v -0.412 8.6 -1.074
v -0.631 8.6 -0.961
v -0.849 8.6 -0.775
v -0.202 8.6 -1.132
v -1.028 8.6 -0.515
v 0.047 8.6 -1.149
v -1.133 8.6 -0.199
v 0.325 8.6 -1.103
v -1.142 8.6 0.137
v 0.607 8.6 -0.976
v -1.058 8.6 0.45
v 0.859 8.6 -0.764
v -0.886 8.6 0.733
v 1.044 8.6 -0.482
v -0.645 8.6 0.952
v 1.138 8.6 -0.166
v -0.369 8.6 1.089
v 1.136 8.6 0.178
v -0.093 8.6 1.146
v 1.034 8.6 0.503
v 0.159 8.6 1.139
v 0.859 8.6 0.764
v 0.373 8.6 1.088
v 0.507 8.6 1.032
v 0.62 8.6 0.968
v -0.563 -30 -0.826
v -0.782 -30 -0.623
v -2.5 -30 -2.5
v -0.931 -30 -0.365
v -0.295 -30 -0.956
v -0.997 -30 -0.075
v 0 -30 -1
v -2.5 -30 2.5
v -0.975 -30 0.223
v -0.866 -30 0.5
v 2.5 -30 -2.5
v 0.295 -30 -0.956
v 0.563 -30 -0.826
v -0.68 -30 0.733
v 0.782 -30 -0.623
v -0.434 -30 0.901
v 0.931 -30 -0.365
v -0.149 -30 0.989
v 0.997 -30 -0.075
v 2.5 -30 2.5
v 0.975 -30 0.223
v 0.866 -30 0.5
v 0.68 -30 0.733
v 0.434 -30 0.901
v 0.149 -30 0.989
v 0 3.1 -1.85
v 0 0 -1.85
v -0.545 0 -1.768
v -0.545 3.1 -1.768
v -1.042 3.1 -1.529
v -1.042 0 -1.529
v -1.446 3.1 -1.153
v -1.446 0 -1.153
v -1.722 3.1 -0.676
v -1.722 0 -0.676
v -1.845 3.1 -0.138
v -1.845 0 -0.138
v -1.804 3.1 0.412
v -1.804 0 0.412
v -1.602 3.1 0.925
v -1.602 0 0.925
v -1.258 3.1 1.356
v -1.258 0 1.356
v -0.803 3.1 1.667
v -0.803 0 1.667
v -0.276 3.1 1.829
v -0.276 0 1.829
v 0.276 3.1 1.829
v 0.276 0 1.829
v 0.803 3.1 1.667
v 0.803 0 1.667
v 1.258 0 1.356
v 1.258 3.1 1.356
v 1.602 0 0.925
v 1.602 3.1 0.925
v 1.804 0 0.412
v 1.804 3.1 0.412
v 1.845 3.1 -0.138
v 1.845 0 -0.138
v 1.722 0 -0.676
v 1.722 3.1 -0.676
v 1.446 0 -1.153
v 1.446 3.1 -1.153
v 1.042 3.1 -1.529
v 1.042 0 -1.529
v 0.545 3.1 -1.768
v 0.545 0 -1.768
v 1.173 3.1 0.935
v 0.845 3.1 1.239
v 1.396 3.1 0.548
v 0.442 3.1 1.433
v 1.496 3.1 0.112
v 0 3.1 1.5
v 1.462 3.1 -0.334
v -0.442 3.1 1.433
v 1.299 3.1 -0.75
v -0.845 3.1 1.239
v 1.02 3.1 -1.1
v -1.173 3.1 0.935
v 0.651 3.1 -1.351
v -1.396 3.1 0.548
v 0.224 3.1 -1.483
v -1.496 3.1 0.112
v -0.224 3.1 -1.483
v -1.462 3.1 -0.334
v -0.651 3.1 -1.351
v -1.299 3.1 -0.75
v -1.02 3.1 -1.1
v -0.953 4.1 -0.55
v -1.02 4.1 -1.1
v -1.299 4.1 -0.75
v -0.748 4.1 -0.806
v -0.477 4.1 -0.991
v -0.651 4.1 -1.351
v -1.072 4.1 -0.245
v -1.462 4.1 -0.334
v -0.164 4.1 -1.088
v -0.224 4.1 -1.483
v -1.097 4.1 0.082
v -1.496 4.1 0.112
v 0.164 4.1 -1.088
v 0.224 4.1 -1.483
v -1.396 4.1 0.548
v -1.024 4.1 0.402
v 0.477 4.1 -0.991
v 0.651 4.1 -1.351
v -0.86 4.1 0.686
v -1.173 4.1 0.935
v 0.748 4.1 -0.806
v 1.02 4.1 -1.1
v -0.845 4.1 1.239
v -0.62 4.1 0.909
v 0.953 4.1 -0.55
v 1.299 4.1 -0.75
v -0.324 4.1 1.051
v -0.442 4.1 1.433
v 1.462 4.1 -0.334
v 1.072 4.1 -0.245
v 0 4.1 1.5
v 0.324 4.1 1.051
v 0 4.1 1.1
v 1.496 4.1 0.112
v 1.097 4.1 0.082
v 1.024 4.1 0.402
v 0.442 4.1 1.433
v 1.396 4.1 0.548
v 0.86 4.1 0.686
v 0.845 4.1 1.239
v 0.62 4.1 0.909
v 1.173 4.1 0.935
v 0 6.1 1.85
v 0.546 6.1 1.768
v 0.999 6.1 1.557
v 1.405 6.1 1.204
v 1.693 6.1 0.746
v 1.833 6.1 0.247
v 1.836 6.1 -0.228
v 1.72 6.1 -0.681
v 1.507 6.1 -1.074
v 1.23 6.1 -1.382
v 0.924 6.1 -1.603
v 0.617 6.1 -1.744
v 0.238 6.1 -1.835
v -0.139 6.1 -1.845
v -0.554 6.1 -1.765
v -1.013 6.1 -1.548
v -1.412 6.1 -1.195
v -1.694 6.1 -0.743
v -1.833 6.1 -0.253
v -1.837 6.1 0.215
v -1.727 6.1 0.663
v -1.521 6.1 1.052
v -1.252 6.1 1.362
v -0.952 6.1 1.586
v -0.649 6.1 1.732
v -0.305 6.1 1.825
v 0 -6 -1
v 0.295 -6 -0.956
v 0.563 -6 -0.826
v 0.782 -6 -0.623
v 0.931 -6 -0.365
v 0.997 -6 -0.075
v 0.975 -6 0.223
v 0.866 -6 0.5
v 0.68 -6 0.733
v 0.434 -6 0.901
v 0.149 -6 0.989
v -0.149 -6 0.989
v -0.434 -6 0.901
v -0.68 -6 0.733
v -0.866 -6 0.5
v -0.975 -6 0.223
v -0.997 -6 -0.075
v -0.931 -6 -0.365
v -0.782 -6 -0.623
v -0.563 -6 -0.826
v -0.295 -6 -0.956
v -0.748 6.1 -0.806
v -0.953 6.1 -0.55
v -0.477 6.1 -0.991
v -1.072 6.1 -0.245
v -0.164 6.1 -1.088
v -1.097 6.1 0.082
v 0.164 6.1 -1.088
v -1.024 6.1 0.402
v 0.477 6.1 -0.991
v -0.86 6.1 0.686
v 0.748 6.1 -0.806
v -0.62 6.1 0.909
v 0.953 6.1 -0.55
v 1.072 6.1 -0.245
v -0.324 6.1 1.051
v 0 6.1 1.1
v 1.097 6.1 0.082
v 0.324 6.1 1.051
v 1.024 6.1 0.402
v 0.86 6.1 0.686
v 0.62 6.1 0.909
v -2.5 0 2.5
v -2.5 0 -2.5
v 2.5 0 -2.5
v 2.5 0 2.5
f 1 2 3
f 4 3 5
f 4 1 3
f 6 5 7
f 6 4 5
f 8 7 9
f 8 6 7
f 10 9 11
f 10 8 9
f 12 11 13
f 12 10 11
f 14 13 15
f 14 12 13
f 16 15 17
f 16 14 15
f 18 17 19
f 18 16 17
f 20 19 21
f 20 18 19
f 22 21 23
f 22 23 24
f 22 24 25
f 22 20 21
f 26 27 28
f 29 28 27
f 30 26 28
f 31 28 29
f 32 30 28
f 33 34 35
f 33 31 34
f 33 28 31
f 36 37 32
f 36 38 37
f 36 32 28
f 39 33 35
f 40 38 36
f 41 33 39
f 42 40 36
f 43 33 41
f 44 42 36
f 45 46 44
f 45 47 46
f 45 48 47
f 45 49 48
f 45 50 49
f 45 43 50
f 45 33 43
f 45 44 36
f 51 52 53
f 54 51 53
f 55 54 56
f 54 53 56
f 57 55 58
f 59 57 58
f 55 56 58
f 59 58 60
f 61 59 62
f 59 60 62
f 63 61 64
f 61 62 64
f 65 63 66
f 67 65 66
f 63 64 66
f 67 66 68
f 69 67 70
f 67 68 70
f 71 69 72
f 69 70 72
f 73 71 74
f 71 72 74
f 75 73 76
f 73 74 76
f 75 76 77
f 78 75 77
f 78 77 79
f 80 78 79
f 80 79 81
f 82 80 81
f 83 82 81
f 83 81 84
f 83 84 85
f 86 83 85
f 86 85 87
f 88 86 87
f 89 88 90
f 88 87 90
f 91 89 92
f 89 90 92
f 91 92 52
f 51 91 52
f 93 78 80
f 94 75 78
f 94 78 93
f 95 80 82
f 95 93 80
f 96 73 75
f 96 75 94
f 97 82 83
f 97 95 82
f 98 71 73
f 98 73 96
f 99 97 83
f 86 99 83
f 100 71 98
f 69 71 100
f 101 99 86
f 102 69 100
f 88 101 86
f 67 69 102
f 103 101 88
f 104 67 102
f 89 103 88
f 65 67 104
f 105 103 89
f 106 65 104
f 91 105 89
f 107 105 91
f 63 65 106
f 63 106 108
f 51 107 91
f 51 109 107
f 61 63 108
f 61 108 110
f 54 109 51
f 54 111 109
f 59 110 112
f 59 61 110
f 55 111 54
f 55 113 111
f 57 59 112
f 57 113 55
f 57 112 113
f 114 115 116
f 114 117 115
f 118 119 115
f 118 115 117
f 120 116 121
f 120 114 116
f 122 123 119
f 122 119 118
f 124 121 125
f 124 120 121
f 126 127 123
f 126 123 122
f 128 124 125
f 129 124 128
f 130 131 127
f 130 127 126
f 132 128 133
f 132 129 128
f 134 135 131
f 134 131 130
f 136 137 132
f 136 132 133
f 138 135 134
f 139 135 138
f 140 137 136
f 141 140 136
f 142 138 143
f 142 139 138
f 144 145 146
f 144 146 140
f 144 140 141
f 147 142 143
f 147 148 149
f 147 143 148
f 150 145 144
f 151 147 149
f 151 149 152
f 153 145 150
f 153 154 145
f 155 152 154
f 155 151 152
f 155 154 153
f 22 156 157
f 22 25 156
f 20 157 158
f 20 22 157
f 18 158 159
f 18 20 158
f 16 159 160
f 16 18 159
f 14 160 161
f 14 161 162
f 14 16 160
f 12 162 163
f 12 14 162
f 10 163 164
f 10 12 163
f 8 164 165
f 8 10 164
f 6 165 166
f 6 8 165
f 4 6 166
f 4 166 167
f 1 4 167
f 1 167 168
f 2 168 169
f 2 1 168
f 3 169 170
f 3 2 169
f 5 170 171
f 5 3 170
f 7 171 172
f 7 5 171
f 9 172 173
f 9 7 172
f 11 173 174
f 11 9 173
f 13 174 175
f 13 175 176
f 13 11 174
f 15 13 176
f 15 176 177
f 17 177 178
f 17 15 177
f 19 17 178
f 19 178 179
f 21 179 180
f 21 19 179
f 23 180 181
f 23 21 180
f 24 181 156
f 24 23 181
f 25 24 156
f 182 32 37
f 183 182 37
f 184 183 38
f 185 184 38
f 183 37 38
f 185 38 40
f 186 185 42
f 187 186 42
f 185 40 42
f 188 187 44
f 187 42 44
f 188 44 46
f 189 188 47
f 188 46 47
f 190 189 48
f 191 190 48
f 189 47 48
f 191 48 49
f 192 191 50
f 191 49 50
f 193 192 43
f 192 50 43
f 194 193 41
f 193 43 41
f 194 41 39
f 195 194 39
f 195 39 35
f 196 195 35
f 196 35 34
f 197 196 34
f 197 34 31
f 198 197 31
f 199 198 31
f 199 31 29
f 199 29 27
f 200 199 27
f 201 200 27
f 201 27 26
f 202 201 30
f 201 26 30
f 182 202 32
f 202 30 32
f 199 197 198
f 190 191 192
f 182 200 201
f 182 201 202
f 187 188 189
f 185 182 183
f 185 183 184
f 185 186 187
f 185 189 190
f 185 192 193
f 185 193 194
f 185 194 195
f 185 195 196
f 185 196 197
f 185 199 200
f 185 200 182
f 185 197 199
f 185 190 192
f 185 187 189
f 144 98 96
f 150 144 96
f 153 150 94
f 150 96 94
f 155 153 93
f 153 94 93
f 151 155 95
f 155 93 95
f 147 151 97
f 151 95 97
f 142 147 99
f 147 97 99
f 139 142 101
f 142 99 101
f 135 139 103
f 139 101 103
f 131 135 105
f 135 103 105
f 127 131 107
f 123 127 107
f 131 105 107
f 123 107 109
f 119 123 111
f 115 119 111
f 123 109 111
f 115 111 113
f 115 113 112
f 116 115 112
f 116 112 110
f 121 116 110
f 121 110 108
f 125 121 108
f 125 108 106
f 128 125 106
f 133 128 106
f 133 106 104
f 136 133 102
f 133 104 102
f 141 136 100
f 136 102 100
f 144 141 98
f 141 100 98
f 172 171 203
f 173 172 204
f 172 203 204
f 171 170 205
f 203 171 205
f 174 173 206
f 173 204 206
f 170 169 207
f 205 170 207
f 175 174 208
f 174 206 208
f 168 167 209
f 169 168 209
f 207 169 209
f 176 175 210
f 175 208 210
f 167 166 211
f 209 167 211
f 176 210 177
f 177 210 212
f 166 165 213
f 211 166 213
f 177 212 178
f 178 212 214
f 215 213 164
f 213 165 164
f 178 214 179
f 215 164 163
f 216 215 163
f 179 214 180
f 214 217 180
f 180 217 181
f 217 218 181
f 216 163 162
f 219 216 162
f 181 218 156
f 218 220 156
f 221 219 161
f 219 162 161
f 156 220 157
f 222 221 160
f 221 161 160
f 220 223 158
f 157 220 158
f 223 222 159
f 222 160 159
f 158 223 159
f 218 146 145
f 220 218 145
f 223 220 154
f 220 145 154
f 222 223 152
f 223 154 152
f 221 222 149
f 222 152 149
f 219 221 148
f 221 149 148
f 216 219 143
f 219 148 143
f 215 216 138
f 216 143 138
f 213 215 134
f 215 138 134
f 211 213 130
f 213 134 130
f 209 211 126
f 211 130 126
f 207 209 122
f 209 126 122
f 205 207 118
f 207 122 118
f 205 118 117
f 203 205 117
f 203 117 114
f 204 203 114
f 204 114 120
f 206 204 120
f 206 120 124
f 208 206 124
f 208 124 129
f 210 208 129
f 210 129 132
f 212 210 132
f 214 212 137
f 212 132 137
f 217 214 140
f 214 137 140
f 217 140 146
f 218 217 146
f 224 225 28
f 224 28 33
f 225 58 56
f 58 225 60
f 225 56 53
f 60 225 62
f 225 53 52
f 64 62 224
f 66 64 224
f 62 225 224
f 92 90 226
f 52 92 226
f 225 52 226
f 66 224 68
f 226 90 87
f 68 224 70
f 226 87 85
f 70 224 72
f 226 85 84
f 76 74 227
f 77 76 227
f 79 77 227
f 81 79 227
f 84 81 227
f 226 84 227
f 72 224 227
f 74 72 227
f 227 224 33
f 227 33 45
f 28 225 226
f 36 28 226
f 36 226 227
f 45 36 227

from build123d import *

# Parameters (mm, degrees)
SKETCH1_R           = 1.85
BOSS_EXTRUDE1_DEPTH = 3.1
SKETCH2_R           = 1.5
BOSS_EXTRUDE2_DEPTH = 1
SKETCH3_R           = 1.1
BOSS_EXTRUDE3_DEPTH = 2
SKETCH6_W           = 5
SKETCH6_H           = 5
BOSS_EXTRUDE4_DEPTH = 30
SKETCH7_R           = 1
CUT_EXTRUDE1_DEPTH  = 24


with BuildPart() as part:
    # Sketch1 → Boss-Extrude1 (new body)
    with BuildSketch(Plane(origin=(0, 0, 0), x_dir=(1, 0, 0), z_dir=(0, 1, 0))):
        with Locations(Location((0, 0, 0), (0, 0, 90))):
            Circle(SKETCH1_R)
    extrude(amount=BOSS_EXTRUDE1_DEPTH)

    # Sketch2 → Boss-Extrude2 (add)
    with BuildSketch(Plane(origin=(0, 3.1, 0), x_dir=(1, 0, 0), z_dir=(0, 1, 0))):
        with Locations(Location((0, 0, 0), (0, 0, 270))):
            Circle(SKETCH2_R)
    extrude(amount=BOSS_EXTRUDE2_DEPTH)

    # Sketch3 → Boss-Extrude3 (add)
    with BuildSketch(Plane(origin=(0, 4.1, 0), x_dir=(1, 0, 0), z_dir=(0, 1, 0))):
        with Locations(Location((0, 0, 0), (0, 0, 270))):
            Circle(SKETCH3_R)
    extrude(amount=BOSS_EXTRUDE3_DEPTH)

    # Loft1: read off the stored shape, not the designer's step
    # Loft1: loft between two sections, ruled curve by curve
    loft1_from = [
        Edge.make_bspline([(0, 6.1, 1.85), (3.7, 6.1, 1.85), (3.7, 6.1, -1.85), (0, 6.1, -1.85), (-3.7, 6.1, -1.85), (-3.7, 6.1, 1.85), (0, 6.1, 1.85)], [0, 0, 0, 0, 0.5, 0.5, 0.5, 1, 1, 1, 1], 3, [1, 0.333333333, 0.333333333, 1, 0.333333333, 0.333333333, 1]),
    ]
    loft1_to = [
        Edge.make_bspline([(0.620465421, 8.6, 0.968257539), (2.556980499, 8.6, -0.272673303), (1.316049657, 8.6, -2.209188381), (-0.620465421, 8.6, -0.968257539), (-2.556980499, 8.6, 0.272673303), (-1.316049657, 8.6, 2.209188381), (0.620465421, 8.6, 0.968257539)], [0, 0, 0, 0, 0.5, 0.5, 0.5, 1, 1, 1, 1], 3, [1, 0.333333333, 0.333333333, 1, 0.333333333, 0.333333333, 1]),
    ]
    loft1 = Solid(Shell([*[Face.make_surface_from_curves(loft1_from[k], loft1_to[k]) for k in range(1)], Face(Wire(loft1_from)), Face(Wire(loft1_to))]))
    add(loft1)

    # Sketch6 → Boss-Extrude4 (add)
    with BuildSketch(Plane.XZ):
        Rectangle(SKETCH6_W, SKETCH6_H)
    extrude(amount=BOSS_EXTRUDE4_DEPTH)

    # Sketch7 → Cut-Extrude1 (cut)
    with BuildSketch(Plane.XZ.offset(30)):
        with Locations(Location((0, 0, 0), (0, 0, 270))):
            Circle(SKETCH7_R)
    extrude(amount=-CUT_EXTRUDE1_DEPTH, mode=Mode.SUBTRACT)


solid = part.part
